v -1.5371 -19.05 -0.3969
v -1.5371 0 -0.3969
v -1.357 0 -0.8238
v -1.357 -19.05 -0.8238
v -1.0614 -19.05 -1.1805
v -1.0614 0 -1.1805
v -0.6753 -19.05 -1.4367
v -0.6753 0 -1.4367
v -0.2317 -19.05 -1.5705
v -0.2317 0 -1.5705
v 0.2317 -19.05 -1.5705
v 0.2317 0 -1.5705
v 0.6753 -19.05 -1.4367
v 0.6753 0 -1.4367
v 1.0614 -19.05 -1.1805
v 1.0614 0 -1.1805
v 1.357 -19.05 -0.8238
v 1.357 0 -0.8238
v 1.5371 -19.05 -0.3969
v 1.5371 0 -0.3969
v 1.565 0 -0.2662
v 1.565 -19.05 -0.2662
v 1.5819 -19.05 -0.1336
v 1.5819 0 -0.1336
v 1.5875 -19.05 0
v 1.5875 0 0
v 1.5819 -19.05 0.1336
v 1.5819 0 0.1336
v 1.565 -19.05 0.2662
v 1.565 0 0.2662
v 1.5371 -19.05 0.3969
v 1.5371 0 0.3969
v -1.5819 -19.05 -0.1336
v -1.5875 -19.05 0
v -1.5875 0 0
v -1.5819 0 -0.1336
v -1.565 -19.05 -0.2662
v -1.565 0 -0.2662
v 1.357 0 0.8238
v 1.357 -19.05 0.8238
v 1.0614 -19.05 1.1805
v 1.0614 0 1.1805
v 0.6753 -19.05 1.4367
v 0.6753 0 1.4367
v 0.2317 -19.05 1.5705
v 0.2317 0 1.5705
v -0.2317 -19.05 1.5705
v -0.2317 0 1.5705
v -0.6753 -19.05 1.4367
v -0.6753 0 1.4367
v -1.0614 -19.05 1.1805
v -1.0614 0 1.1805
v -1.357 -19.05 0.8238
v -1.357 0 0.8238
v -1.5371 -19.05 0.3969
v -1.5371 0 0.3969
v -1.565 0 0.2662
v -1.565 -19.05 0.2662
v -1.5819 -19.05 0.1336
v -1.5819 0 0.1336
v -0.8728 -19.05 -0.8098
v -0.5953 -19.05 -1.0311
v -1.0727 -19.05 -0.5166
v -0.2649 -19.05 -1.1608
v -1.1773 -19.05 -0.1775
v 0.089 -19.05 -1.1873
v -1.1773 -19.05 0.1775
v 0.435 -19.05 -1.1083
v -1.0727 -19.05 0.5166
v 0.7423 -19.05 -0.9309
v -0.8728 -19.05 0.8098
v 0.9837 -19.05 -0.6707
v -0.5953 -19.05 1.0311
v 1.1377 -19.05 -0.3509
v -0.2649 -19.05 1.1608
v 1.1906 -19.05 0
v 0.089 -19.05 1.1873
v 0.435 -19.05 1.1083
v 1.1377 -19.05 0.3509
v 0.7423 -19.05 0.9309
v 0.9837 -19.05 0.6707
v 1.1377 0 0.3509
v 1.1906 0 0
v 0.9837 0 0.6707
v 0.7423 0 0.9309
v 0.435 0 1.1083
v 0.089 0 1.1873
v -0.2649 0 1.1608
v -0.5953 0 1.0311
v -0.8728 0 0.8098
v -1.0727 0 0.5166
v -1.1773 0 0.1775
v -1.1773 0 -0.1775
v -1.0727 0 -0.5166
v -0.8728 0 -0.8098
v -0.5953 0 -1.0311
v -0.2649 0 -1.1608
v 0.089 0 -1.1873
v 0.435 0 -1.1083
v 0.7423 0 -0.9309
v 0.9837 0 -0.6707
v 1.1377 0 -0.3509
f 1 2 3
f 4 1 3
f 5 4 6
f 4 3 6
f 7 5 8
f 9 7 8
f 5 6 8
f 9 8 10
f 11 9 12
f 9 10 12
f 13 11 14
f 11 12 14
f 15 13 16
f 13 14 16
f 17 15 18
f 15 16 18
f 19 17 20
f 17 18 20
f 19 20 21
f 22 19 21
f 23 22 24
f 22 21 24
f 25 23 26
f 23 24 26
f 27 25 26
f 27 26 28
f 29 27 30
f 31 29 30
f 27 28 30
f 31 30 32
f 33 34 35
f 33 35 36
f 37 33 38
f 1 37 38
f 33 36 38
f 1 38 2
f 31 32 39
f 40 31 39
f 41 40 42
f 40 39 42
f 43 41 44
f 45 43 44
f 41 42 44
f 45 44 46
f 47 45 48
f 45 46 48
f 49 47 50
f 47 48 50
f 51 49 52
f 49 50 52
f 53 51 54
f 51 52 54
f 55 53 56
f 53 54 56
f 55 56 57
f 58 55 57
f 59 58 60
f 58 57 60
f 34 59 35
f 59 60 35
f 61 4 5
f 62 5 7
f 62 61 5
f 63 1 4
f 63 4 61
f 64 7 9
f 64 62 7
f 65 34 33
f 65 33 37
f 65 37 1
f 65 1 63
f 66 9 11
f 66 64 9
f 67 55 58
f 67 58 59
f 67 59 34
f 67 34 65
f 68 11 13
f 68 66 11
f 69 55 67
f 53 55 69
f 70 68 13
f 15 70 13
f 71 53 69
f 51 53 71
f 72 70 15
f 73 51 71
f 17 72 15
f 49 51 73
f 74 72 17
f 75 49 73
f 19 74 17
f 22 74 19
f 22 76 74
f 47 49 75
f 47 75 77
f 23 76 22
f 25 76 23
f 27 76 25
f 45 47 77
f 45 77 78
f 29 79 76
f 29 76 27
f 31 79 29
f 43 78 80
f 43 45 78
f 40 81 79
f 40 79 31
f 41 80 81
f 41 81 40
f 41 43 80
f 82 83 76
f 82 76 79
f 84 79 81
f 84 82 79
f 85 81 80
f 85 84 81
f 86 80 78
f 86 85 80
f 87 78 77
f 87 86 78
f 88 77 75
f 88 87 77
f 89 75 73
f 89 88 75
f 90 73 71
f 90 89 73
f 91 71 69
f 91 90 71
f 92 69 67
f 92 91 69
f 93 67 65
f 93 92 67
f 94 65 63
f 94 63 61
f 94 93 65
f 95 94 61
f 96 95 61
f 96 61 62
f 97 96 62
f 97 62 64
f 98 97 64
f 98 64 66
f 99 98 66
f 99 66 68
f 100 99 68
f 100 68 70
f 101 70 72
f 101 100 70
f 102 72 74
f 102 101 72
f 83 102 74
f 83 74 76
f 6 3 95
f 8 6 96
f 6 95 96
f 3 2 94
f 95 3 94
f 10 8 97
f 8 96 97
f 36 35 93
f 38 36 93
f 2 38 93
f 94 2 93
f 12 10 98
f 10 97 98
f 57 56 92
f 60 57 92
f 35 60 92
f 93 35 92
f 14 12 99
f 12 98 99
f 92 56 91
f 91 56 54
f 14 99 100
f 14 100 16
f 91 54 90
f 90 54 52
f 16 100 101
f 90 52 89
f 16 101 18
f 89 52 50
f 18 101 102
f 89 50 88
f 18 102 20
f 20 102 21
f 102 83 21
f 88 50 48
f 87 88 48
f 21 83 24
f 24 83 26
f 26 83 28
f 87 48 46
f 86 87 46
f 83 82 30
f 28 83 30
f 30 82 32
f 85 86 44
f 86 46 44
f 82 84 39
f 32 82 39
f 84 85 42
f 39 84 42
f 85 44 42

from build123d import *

# Parameters (mm, degrees)
F0_R     = 1.190625
F1_DEPTH = 19.05


with BuildPart() as f1:
    # F0 (on Front) → F1 (new body)
    with BuildSketch(Plane.XZ):
        with BuildLine():
            ThreePointArc((1.5875, 0), (1.574847, 0.200032), (1.53709, 0.396875))
            ThreePointArc((1.53709, 0.396875), (0, 1.5875), (-1.53709, 0.396875))
            ThreePointArc((-1.53709, 0.396875), (-1.574847, 0.200032), (-1.5875, 0))
            ThreePointArc((-1.5875, 0), (-1.574847, -0.200032), (-1.53709, -0.396875))
            ThreePointArc((-1.53709, -0.396875), (0, -1.5875), (1.53709, -0.396875))
            ThreePointArc((1.53709, -0.396875), (1.574847, -0.200032), (1.5875, 0))
        make_face()
        Circle(F0_R, mode=Mode.SUBTRACT)
    extrude(amount=F1_DEPTH)


solid = f1.part
